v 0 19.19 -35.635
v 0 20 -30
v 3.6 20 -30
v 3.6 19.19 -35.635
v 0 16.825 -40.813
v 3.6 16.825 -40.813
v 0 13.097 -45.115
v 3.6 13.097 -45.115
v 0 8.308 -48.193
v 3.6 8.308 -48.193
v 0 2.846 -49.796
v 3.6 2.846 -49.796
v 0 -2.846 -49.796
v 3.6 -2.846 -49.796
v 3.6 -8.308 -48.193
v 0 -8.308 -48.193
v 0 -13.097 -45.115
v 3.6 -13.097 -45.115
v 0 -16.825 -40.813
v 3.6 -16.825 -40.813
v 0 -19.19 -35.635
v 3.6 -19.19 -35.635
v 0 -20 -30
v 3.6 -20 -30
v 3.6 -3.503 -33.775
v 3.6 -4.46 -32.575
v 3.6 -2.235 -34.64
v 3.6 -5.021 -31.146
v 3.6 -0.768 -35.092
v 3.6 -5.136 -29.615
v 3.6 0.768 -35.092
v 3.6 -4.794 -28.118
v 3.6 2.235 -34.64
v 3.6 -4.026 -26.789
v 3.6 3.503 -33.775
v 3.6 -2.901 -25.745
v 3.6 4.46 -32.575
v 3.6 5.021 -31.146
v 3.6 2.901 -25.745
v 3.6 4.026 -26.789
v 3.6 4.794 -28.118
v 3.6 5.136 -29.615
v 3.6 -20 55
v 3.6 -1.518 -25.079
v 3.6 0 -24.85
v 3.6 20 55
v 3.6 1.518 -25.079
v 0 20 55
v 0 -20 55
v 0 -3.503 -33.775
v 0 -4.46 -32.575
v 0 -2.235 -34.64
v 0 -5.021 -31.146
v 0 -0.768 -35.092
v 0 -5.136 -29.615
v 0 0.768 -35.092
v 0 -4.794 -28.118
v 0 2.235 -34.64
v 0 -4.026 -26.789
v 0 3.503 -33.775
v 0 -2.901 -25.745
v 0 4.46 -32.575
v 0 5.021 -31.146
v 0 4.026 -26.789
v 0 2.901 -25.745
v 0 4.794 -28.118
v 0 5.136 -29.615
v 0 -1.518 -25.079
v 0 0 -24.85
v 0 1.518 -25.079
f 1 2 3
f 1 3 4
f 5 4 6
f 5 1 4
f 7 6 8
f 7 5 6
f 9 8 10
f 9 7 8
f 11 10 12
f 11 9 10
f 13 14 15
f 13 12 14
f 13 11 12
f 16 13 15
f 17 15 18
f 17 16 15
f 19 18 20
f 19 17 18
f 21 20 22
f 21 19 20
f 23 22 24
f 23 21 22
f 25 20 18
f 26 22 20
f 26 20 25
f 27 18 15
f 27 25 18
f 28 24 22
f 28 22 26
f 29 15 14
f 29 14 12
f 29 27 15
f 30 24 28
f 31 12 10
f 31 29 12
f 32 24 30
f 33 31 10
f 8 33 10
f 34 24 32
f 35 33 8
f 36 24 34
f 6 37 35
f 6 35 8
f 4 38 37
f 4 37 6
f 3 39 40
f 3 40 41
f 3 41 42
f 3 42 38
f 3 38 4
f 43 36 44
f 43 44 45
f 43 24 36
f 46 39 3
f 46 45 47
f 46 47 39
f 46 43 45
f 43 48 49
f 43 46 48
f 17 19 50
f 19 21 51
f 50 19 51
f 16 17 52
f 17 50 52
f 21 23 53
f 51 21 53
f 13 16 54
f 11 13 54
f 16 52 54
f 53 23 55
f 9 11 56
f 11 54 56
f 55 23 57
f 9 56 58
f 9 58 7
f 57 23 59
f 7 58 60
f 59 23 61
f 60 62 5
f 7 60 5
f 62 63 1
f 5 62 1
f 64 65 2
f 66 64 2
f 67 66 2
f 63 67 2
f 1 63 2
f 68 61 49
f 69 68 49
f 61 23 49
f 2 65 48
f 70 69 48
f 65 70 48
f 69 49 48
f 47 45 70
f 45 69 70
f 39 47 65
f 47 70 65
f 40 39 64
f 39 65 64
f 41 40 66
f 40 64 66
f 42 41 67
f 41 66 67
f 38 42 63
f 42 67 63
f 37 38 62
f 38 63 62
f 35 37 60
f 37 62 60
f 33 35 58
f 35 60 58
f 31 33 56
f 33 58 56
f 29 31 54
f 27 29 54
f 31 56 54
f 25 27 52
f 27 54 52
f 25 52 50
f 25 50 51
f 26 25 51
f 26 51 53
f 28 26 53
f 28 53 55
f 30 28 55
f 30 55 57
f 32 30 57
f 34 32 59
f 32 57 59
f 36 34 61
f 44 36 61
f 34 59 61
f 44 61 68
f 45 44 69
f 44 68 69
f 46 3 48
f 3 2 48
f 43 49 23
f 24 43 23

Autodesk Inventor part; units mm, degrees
ref_plane "YZ Plane" through (0, 0, 0) normal (1, 0, 0) x (0, 1, 0)
ref_plane "XZ Plane" through (0, 0, 0) normal (0, 1, 0) x (-1, 0, 0)
ref_plane "XY Plane" through (0, 0, 0) normal (0, 0, 1) x (1, 0, 0)
sketch "Sketch1" plane through (0, 0, 0) normal (1, 0, 0) x (0, 1, 0)
  line L0 (-20, -30) -> (20, -30)
  line L1 (20, -30) -> (20, 30)
  line L2 (20, 30) -> (-20, 30)
  line L3 (-20, 30) -> (-20, -30)
  line L4 (-20, -30) -> (20, 30) construction
  line L5 (20, -30) -> (-20, 30) construction
  circle A0 centre (0, -30) radius 20
  point P0 (0, 0)
  dimension "d0" = 40
  dimension "d1" = 60
extrude "Extrusion1" add sketch "Sketch1" along normal blind 3.6
sketch "Sketch4" plane through (3.6, 0, 0) normal (1, 0, 0) x (0, 0, -1)
  line L0 (-5, 20) -> (-55, 20)
  line L1 (-55, 20) -> (-55, -20)
  line L2 (-55, -20) -> (-5, -20)
  line L3 (-5, -20) -> (-5, 20)
  line L4 (0, -64) -> (0, 34) projected
  line L5 (-10, -75.9609) -> (-10, 61.6)
  line L6 (30, 20) -> (-30, 20) projected
  dimension "d40" = 50
  dimension "d41" = 40
  dimension "d50" = 10
  dimension "d51" = 5
  dimension "d53" = 0
extrude "Extrusion4" add sketch "Sketch4" against normal blind 3.6
sketch "Sketch5" plane through (0, 0, 0) normal (-1, 0, 0) x (0, 0, 1)
  line L0 (52, -47) -> (41.7, -47)
  line L1 (41.7, -47) -> (41.7, -42.7)
  line L2 (41.7, -42.7) -> (52, -42.7)
  line L3 (52, -42.7) -> (52, -47)
  line L4 (55, -20) -> (55, -6.689)
  line L5 (55, -20) -> (55, 20) projected
  line L6 (55, -50) -> (10.2215, -50)
  line L7 (5, -50) -> (55, -50) projected
  point P0 (10.2215, -50)
  dimension "d20" = 10.3
  dimension "d21" = 4.3
  dimension "d42" = 3
  dimension "d43" = 3
extrude "Extrusion5" cut sketch "Sketch5" against normal blind 4
sketch "Sketch2" plane through (0, 0, 0) normal (-1, 0, 0) x (0, 0, 1)
  arc A0 (-30, 20) -> (-30, -20) centre (-30, 0) ccw projected
  circle A1 centre (-30, 0) radius 5.15
  point P0 (0, 0)
  dimension "d4" = 10.3
extrude "Extrusion2" cut sketch "Sketch2" against normal blind 4
fillet "Fillet3" [suppressed]
properties part number "houder"
